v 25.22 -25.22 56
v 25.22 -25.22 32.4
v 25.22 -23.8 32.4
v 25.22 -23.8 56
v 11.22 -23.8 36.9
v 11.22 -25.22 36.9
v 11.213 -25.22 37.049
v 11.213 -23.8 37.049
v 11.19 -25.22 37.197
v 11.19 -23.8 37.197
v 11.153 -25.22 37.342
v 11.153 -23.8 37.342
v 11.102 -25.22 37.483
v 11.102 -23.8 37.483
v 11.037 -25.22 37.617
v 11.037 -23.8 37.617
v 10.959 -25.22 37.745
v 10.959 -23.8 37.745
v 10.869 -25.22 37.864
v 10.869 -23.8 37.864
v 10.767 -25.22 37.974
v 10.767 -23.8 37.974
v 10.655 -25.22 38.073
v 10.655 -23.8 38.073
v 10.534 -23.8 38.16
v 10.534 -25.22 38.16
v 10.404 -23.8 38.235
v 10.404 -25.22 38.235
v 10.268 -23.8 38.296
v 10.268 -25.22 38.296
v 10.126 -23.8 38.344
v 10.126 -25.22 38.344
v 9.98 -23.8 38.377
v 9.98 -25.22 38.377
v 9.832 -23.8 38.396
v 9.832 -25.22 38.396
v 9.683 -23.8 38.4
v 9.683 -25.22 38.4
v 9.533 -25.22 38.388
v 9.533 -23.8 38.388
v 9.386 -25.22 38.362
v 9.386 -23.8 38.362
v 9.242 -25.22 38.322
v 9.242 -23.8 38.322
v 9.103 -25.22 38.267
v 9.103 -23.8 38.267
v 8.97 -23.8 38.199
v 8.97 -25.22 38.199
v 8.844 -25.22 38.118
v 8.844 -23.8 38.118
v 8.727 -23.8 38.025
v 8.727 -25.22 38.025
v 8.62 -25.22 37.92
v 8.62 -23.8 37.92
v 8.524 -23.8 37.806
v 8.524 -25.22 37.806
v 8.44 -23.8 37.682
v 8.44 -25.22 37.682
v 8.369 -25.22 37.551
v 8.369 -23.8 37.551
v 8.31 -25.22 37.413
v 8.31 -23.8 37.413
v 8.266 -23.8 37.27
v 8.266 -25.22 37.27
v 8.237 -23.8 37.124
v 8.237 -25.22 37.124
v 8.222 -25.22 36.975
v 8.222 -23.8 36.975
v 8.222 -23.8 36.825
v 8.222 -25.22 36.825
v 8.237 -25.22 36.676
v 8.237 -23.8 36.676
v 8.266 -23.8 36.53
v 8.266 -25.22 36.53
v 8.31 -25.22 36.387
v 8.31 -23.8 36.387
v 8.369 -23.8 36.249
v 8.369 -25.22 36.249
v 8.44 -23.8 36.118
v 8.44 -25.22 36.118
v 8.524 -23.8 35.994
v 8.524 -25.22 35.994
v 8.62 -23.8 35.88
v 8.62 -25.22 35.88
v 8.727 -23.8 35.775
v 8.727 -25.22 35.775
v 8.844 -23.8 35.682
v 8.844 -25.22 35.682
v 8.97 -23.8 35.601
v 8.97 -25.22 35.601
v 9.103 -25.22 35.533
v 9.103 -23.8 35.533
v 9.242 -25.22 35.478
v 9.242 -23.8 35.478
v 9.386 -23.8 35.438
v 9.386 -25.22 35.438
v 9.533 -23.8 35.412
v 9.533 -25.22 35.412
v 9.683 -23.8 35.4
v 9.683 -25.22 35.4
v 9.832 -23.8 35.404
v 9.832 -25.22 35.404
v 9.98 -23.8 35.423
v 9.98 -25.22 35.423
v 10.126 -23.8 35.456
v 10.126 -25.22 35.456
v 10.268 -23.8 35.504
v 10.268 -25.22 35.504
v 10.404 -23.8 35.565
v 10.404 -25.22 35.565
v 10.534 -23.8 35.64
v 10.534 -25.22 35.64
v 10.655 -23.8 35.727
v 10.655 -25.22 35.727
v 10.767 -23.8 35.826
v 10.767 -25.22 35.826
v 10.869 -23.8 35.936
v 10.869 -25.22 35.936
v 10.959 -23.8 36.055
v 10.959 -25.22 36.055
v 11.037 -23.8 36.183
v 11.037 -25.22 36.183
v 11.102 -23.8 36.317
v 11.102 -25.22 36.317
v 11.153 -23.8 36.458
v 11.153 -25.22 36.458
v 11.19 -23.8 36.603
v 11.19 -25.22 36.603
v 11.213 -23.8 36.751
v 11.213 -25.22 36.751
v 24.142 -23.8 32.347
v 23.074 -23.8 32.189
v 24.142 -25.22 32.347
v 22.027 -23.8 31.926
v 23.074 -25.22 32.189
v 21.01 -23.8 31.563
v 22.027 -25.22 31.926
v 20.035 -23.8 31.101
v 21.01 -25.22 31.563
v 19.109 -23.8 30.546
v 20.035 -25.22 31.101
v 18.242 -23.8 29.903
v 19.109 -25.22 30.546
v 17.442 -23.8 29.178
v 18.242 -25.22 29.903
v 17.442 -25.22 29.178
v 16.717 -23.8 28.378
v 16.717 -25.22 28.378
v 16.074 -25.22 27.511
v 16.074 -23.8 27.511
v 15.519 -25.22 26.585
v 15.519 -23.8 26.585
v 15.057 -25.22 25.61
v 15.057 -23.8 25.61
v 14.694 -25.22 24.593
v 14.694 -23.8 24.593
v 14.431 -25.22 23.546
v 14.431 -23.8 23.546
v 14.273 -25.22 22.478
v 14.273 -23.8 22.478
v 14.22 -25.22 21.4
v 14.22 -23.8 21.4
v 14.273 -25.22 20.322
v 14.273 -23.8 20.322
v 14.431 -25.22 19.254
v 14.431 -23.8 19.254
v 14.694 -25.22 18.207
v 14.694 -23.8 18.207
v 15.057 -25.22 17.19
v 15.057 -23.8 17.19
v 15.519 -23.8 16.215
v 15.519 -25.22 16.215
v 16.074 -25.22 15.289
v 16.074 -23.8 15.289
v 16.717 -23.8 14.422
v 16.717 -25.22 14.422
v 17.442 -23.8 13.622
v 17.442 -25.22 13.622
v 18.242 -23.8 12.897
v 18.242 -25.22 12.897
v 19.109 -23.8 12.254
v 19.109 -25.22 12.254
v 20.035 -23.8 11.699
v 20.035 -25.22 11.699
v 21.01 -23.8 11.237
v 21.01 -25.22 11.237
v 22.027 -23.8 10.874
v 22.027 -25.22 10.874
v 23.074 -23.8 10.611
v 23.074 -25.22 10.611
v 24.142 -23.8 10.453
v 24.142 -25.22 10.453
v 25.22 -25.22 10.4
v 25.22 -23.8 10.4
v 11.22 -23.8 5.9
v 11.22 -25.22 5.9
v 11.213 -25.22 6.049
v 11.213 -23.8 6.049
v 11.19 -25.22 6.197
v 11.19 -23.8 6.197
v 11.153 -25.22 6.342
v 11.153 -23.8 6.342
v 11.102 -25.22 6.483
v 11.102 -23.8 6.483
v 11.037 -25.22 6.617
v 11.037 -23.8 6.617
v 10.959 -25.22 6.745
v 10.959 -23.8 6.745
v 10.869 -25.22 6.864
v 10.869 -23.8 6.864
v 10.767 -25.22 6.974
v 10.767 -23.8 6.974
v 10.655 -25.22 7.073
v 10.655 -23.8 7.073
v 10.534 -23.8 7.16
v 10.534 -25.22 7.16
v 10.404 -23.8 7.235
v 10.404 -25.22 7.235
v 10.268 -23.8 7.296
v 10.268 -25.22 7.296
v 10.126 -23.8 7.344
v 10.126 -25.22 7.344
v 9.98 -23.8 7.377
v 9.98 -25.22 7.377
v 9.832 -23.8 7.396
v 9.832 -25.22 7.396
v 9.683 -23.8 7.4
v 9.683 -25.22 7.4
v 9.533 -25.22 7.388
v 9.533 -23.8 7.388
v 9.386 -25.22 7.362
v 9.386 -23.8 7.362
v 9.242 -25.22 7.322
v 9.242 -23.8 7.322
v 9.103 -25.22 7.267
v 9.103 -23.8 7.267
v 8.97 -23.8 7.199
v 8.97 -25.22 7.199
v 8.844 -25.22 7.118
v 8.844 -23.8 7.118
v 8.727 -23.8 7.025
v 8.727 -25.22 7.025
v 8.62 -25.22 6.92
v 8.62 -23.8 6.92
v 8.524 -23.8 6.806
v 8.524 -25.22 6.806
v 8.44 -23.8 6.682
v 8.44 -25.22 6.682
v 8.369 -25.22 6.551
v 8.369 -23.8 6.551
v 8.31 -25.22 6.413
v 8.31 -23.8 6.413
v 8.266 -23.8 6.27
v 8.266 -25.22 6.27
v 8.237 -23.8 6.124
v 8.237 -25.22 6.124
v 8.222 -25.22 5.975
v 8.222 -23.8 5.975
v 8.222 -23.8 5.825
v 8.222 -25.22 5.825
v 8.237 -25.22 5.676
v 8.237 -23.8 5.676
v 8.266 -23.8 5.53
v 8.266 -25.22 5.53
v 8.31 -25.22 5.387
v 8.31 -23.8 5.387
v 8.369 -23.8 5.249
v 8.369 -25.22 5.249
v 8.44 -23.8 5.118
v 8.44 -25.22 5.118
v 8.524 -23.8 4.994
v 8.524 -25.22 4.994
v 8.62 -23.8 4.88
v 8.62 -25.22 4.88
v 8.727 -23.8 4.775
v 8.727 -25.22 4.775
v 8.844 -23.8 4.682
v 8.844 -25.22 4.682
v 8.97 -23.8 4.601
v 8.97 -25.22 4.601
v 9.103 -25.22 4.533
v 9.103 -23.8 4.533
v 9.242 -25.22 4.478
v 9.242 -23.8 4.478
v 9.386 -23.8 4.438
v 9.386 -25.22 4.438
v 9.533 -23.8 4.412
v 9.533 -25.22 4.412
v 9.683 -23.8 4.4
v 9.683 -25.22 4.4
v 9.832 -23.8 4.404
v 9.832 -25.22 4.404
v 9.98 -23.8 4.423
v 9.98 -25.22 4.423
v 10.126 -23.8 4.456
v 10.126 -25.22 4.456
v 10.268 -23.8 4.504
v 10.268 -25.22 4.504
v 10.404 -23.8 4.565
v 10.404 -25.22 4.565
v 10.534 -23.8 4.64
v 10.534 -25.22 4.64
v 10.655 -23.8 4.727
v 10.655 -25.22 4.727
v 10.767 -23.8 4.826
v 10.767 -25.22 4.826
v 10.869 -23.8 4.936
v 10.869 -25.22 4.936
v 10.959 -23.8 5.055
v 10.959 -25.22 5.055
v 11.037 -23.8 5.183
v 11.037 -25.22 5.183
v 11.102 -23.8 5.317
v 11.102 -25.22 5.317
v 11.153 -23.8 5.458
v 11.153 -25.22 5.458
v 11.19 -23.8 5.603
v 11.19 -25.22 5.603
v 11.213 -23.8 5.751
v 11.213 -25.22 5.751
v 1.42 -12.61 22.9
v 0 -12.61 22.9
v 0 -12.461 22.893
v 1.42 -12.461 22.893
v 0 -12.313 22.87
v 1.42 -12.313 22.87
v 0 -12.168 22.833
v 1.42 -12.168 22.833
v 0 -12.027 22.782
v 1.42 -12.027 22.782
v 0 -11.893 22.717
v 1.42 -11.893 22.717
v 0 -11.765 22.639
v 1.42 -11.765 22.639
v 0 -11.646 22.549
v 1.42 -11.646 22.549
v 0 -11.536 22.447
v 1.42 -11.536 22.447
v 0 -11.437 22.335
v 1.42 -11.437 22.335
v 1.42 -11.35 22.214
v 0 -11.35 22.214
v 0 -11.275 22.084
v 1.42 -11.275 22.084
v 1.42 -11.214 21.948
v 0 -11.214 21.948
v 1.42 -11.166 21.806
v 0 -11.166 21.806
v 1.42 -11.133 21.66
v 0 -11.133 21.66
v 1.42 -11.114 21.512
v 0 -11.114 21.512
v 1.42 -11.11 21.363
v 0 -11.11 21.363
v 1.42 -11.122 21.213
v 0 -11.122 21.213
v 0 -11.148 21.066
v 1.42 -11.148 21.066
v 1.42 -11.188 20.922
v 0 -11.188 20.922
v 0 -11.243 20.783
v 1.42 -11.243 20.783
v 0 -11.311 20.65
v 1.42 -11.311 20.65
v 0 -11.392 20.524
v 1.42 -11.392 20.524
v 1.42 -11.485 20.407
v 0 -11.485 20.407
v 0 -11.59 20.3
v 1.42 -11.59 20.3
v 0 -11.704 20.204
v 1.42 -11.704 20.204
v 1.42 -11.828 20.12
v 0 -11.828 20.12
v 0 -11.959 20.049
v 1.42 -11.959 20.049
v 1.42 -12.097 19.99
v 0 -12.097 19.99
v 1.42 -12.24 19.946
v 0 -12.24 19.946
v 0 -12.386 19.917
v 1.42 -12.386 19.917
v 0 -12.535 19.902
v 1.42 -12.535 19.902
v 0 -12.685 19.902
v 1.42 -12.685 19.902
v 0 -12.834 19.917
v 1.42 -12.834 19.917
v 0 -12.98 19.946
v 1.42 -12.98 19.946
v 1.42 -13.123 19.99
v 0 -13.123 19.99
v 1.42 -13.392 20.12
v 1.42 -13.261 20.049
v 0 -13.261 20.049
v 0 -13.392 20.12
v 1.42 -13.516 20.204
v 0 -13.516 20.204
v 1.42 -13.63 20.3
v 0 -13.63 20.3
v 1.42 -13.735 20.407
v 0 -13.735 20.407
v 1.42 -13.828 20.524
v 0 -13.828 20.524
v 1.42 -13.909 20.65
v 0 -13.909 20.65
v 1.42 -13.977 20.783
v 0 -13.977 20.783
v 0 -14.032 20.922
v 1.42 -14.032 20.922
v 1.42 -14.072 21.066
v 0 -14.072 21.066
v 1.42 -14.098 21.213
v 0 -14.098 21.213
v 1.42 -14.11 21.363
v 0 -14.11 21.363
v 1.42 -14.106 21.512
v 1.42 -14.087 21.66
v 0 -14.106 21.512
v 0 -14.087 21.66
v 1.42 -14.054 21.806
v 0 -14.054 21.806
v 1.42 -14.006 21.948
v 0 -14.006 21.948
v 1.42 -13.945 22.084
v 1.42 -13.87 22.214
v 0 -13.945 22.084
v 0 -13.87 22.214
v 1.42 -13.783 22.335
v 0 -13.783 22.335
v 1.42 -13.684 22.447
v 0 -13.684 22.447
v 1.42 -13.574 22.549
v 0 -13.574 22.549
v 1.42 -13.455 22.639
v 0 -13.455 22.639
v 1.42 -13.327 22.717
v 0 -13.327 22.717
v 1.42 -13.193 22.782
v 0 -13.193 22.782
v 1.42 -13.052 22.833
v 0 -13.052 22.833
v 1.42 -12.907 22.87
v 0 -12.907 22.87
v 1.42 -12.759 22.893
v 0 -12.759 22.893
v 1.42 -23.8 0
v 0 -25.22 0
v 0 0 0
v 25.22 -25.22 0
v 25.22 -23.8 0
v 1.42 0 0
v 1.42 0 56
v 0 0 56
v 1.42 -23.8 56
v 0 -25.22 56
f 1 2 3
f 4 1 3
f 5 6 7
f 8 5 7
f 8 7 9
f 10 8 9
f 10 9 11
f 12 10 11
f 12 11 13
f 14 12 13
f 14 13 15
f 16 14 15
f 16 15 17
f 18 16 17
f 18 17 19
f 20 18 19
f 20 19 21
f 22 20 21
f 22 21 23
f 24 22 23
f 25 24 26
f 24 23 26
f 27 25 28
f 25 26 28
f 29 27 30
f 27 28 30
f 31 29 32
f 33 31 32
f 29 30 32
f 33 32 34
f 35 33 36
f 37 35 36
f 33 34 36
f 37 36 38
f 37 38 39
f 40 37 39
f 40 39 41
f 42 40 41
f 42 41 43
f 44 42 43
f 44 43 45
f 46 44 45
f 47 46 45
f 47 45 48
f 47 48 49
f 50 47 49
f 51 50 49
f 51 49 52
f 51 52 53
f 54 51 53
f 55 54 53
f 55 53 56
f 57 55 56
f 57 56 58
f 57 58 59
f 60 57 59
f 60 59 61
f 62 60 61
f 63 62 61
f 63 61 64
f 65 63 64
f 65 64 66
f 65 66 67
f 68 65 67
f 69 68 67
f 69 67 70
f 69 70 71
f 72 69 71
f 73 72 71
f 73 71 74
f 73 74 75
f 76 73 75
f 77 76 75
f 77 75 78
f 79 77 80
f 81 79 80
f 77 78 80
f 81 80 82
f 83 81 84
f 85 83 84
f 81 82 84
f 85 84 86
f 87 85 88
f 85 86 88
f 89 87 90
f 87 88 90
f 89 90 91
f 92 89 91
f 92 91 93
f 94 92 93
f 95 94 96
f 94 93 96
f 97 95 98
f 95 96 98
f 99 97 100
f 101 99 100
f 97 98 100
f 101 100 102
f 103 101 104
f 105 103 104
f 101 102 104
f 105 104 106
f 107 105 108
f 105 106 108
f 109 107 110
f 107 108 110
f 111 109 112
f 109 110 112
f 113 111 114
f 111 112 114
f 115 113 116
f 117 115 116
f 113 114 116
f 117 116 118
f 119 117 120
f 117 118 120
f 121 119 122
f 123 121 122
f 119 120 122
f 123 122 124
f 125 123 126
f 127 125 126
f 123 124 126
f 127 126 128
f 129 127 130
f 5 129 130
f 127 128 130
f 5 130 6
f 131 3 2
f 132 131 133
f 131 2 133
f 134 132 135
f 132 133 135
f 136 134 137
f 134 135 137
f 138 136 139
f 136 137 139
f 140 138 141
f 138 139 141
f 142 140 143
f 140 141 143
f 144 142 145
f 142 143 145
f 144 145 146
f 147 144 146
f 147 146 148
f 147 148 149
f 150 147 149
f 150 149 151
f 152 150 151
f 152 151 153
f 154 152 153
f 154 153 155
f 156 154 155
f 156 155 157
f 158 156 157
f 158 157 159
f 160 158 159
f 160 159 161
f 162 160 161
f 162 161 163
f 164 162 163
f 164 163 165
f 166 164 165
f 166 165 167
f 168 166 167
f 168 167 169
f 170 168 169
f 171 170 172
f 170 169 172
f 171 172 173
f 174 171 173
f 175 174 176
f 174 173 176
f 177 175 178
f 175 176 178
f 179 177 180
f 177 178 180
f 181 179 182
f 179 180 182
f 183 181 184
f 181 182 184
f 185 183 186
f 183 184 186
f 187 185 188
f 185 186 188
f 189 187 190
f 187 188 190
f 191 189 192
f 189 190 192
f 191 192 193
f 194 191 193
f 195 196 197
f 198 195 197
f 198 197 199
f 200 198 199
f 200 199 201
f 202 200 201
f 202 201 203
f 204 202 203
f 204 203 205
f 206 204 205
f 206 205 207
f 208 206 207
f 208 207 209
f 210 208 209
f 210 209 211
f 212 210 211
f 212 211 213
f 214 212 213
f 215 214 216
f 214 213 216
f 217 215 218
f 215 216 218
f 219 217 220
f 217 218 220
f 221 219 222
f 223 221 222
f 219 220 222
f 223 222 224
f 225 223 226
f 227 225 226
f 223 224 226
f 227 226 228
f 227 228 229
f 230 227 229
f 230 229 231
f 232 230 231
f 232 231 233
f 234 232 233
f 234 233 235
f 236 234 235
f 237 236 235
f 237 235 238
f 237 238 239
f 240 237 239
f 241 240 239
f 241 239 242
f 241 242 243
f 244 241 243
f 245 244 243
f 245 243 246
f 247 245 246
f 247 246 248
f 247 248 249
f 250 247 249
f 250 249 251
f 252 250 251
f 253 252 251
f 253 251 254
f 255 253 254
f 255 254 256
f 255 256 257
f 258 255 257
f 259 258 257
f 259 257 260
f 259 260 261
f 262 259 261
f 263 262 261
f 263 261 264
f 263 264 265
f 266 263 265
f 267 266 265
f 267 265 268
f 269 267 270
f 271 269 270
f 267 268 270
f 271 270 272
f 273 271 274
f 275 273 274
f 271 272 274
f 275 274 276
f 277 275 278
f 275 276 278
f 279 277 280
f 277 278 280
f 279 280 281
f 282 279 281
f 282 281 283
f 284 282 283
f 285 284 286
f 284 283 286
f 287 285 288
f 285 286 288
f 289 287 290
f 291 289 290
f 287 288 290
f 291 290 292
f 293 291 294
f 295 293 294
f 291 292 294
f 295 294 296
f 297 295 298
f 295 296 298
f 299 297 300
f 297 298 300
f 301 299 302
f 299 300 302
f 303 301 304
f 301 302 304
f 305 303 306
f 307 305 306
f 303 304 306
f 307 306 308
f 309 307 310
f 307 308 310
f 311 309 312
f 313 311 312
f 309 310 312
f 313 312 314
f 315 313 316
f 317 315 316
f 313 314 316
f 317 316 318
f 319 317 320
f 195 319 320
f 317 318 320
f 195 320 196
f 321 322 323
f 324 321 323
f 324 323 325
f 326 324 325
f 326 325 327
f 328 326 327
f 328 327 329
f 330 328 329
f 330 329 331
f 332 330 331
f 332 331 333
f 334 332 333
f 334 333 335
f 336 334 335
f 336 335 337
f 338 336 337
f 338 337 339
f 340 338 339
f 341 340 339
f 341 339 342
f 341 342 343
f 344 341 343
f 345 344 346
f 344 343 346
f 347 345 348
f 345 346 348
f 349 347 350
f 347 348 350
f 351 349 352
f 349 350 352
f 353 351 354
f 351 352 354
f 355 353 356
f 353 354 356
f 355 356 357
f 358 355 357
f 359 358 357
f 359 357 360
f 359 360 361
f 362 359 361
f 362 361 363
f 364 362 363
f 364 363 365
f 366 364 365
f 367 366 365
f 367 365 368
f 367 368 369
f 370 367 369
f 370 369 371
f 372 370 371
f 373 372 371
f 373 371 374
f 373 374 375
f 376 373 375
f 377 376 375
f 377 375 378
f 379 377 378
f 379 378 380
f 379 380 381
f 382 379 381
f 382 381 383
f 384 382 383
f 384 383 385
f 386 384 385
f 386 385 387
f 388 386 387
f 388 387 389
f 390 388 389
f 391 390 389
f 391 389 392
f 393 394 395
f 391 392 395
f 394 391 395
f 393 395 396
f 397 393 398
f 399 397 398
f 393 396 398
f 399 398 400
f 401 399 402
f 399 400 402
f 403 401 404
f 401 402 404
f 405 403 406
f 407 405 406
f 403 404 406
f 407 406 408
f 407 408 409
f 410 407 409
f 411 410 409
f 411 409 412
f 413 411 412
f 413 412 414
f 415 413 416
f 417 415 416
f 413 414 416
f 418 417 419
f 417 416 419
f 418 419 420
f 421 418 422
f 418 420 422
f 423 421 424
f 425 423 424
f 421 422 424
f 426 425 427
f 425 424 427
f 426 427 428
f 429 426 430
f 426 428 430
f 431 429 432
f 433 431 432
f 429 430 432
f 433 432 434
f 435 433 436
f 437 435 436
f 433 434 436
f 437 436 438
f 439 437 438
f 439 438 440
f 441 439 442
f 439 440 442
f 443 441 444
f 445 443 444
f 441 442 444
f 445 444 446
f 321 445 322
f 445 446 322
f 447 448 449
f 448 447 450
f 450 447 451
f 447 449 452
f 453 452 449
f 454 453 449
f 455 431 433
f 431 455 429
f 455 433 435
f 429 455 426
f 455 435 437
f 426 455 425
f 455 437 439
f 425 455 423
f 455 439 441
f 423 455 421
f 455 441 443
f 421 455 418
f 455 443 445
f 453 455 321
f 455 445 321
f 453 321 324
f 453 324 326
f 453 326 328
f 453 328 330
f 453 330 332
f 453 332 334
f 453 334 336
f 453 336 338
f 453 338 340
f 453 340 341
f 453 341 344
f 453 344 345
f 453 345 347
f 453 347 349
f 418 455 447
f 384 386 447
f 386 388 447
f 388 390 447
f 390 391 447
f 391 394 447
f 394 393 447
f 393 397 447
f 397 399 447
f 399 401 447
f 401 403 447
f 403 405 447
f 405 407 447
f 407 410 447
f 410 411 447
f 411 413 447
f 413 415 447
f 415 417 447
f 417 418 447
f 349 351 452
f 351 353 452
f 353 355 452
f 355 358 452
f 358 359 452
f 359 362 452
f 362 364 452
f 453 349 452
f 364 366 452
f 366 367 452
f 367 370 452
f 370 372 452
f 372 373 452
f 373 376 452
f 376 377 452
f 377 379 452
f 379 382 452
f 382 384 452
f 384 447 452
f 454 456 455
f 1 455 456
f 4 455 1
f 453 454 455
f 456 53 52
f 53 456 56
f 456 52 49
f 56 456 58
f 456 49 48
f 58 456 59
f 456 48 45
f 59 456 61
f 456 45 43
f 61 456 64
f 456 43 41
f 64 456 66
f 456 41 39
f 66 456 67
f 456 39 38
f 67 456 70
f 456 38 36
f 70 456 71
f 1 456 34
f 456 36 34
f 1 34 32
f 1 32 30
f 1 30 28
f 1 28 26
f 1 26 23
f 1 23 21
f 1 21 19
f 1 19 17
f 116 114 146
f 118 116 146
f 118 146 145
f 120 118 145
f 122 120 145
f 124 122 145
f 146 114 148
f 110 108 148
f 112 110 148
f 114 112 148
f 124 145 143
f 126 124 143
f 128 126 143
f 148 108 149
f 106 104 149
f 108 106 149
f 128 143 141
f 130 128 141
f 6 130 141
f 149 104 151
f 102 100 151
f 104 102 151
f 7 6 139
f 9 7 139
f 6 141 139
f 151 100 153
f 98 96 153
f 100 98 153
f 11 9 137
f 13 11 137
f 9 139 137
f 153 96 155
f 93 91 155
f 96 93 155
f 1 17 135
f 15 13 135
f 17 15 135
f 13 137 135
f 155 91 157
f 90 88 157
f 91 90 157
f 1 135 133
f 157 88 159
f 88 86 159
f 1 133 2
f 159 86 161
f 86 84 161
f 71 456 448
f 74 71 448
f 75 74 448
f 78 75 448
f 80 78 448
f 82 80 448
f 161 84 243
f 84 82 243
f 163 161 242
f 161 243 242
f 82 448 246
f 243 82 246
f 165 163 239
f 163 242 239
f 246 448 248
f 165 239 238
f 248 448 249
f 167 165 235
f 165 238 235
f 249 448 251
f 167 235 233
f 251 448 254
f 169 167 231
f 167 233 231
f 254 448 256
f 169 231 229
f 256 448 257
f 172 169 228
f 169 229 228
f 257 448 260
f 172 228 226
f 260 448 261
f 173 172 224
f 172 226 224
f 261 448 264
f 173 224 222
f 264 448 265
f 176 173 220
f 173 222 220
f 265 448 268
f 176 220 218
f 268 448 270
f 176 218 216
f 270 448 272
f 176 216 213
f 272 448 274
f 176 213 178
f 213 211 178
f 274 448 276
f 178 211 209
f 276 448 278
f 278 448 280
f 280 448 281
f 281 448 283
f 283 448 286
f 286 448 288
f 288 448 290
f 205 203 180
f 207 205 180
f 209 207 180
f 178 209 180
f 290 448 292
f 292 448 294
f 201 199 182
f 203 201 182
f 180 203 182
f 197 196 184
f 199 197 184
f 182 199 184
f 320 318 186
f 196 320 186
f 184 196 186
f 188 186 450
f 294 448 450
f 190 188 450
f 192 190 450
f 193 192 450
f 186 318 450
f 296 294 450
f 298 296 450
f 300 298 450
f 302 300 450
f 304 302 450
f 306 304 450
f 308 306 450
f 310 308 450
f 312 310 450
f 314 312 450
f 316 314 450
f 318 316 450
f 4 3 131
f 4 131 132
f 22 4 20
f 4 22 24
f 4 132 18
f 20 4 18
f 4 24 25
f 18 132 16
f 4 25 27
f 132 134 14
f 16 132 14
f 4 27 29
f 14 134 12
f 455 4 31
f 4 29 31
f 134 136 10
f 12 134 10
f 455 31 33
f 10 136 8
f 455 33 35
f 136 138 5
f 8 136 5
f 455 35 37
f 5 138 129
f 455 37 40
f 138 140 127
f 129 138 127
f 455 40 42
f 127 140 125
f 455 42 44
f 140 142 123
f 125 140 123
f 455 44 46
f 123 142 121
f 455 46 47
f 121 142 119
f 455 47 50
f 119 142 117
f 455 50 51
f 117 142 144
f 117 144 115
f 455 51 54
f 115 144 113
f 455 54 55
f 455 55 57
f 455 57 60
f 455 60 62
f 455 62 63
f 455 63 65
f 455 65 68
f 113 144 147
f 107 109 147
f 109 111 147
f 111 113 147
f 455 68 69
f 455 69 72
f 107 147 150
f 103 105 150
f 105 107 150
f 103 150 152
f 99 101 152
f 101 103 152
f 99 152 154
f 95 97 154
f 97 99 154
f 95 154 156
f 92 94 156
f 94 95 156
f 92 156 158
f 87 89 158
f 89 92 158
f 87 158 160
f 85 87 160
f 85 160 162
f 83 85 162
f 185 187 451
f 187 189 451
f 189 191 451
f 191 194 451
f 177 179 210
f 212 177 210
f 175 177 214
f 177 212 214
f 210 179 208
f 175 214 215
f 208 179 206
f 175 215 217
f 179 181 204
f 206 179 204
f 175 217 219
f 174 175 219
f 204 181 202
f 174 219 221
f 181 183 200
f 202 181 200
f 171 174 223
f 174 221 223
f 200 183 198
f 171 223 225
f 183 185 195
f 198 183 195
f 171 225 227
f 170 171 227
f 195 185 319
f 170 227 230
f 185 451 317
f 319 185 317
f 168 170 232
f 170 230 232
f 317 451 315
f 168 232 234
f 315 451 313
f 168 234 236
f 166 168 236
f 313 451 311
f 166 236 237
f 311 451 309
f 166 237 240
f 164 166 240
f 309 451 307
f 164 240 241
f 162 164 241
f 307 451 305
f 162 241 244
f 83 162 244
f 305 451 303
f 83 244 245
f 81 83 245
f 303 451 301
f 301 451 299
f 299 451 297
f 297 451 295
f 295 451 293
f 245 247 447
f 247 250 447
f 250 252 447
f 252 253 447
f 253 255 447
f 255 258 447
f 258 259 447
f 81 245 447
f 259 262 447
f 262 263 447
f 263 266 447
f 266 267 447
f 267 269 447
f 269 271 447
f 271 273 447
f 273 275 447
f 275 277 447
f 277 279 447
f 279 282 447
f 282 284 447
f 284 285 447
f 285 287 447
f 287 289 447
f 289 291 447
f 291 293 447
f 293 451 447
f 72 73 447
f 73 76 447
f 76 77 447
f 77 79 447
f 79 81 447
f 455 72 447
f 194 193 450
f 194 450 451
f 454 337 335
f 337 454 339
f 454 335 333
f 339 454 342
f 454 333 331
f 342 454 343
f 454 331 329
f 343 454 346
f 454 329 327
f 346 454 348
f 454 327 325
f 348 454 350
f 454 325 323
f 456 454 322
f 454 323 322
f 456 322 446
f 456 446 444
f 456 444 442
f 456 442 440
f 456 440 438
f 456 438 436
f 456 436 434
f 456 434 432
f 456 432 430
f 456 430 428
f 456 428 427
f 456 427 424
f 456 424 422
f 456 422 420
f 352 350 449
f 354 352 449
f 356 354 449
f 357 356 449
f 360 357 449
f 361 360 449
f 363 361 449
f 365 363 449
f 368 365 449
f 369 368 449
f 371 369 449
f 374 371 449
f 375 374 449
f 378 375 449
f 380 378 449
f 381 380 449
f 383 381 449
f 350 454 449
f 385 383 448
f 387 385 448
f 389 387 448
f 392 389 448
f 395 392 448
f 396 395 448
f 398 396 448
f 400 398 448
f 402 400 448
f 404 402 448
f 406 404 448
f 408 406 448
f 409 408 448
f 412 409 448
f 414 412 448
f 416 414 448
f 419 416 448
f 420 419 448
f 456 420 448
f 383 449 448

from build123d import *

# Parameters (mm, degrees)
EXTRUDE1_DEPTH     = 56
SKETCH2_R          = 1.5
CUT_EXTRUDE1_DEPTH = 26.22
SKETCH3_R          = 11
CUT_EXTRUDE2_DEPTH = 26.22
SKETCH4_R          = 1.5
CUT_EXTRUDE3_DEPTH = 26.22
SKETCH5_R          = 1.5
CUT_EXTRUDE4_DEPTH = 26.22


with BuildPart() as part:
    # Sketch1 → Extrude1 (new body)
    with BuildSketch(Plane.XY):
        Polygon((0, 0), (0, -25.22), (25.22, -25.22), (25.22, -23.8), (1.42, -23.8), (1.42, 0), align=None)
    extrude(amount=EXTRUDE1_DEPTH)

    # Sketch2 → Cut-Extrude1 (cut, through all)
    with BuildSketch(Plane.ZY):
        with Locations((21.4, -12.61)):
            Circle(SKETCH2_R)
    extrude(amount=-CUT_EXTRUDE1_DEPTH, mode=Mode.SUBTRACT)

    # Sketch3 → Cut-Extrude2 (cut, through all)
    with BuildSketch(Plane.XZ.offset(25.22)):
        with Locations((25.22, 21.4)):
            Circle(SKETCH3_R)
    extrude(amount=-CUT_EXTRUDE2_DEPTH, mode=Mode.SUBTRACT)

    # Sketch4 → Cut-Extrude3 (cut, through all)
    with BuildSketch(Plane.XZ.offset(25.22)):
        with Locations((9.72, 36.9)):
            Circle(SKETCH4_R)
    extrude(amount=-CUT_EXTRUDE3_DEPTH, mode=Mode.SUBTRACT)

    # Sketch5 → Cut-Extrude4 (cut, through all)
    with BuildSketch(Plane.XZ.offset(25.22)):
        with Locations((9.72, 5.9)):
            Circle(SKETCH5_R)
    extrude(amount=-CUT_EXTRUDE4_DEPTH, mode=Mode.SUBTRACT)


solid = part.part
